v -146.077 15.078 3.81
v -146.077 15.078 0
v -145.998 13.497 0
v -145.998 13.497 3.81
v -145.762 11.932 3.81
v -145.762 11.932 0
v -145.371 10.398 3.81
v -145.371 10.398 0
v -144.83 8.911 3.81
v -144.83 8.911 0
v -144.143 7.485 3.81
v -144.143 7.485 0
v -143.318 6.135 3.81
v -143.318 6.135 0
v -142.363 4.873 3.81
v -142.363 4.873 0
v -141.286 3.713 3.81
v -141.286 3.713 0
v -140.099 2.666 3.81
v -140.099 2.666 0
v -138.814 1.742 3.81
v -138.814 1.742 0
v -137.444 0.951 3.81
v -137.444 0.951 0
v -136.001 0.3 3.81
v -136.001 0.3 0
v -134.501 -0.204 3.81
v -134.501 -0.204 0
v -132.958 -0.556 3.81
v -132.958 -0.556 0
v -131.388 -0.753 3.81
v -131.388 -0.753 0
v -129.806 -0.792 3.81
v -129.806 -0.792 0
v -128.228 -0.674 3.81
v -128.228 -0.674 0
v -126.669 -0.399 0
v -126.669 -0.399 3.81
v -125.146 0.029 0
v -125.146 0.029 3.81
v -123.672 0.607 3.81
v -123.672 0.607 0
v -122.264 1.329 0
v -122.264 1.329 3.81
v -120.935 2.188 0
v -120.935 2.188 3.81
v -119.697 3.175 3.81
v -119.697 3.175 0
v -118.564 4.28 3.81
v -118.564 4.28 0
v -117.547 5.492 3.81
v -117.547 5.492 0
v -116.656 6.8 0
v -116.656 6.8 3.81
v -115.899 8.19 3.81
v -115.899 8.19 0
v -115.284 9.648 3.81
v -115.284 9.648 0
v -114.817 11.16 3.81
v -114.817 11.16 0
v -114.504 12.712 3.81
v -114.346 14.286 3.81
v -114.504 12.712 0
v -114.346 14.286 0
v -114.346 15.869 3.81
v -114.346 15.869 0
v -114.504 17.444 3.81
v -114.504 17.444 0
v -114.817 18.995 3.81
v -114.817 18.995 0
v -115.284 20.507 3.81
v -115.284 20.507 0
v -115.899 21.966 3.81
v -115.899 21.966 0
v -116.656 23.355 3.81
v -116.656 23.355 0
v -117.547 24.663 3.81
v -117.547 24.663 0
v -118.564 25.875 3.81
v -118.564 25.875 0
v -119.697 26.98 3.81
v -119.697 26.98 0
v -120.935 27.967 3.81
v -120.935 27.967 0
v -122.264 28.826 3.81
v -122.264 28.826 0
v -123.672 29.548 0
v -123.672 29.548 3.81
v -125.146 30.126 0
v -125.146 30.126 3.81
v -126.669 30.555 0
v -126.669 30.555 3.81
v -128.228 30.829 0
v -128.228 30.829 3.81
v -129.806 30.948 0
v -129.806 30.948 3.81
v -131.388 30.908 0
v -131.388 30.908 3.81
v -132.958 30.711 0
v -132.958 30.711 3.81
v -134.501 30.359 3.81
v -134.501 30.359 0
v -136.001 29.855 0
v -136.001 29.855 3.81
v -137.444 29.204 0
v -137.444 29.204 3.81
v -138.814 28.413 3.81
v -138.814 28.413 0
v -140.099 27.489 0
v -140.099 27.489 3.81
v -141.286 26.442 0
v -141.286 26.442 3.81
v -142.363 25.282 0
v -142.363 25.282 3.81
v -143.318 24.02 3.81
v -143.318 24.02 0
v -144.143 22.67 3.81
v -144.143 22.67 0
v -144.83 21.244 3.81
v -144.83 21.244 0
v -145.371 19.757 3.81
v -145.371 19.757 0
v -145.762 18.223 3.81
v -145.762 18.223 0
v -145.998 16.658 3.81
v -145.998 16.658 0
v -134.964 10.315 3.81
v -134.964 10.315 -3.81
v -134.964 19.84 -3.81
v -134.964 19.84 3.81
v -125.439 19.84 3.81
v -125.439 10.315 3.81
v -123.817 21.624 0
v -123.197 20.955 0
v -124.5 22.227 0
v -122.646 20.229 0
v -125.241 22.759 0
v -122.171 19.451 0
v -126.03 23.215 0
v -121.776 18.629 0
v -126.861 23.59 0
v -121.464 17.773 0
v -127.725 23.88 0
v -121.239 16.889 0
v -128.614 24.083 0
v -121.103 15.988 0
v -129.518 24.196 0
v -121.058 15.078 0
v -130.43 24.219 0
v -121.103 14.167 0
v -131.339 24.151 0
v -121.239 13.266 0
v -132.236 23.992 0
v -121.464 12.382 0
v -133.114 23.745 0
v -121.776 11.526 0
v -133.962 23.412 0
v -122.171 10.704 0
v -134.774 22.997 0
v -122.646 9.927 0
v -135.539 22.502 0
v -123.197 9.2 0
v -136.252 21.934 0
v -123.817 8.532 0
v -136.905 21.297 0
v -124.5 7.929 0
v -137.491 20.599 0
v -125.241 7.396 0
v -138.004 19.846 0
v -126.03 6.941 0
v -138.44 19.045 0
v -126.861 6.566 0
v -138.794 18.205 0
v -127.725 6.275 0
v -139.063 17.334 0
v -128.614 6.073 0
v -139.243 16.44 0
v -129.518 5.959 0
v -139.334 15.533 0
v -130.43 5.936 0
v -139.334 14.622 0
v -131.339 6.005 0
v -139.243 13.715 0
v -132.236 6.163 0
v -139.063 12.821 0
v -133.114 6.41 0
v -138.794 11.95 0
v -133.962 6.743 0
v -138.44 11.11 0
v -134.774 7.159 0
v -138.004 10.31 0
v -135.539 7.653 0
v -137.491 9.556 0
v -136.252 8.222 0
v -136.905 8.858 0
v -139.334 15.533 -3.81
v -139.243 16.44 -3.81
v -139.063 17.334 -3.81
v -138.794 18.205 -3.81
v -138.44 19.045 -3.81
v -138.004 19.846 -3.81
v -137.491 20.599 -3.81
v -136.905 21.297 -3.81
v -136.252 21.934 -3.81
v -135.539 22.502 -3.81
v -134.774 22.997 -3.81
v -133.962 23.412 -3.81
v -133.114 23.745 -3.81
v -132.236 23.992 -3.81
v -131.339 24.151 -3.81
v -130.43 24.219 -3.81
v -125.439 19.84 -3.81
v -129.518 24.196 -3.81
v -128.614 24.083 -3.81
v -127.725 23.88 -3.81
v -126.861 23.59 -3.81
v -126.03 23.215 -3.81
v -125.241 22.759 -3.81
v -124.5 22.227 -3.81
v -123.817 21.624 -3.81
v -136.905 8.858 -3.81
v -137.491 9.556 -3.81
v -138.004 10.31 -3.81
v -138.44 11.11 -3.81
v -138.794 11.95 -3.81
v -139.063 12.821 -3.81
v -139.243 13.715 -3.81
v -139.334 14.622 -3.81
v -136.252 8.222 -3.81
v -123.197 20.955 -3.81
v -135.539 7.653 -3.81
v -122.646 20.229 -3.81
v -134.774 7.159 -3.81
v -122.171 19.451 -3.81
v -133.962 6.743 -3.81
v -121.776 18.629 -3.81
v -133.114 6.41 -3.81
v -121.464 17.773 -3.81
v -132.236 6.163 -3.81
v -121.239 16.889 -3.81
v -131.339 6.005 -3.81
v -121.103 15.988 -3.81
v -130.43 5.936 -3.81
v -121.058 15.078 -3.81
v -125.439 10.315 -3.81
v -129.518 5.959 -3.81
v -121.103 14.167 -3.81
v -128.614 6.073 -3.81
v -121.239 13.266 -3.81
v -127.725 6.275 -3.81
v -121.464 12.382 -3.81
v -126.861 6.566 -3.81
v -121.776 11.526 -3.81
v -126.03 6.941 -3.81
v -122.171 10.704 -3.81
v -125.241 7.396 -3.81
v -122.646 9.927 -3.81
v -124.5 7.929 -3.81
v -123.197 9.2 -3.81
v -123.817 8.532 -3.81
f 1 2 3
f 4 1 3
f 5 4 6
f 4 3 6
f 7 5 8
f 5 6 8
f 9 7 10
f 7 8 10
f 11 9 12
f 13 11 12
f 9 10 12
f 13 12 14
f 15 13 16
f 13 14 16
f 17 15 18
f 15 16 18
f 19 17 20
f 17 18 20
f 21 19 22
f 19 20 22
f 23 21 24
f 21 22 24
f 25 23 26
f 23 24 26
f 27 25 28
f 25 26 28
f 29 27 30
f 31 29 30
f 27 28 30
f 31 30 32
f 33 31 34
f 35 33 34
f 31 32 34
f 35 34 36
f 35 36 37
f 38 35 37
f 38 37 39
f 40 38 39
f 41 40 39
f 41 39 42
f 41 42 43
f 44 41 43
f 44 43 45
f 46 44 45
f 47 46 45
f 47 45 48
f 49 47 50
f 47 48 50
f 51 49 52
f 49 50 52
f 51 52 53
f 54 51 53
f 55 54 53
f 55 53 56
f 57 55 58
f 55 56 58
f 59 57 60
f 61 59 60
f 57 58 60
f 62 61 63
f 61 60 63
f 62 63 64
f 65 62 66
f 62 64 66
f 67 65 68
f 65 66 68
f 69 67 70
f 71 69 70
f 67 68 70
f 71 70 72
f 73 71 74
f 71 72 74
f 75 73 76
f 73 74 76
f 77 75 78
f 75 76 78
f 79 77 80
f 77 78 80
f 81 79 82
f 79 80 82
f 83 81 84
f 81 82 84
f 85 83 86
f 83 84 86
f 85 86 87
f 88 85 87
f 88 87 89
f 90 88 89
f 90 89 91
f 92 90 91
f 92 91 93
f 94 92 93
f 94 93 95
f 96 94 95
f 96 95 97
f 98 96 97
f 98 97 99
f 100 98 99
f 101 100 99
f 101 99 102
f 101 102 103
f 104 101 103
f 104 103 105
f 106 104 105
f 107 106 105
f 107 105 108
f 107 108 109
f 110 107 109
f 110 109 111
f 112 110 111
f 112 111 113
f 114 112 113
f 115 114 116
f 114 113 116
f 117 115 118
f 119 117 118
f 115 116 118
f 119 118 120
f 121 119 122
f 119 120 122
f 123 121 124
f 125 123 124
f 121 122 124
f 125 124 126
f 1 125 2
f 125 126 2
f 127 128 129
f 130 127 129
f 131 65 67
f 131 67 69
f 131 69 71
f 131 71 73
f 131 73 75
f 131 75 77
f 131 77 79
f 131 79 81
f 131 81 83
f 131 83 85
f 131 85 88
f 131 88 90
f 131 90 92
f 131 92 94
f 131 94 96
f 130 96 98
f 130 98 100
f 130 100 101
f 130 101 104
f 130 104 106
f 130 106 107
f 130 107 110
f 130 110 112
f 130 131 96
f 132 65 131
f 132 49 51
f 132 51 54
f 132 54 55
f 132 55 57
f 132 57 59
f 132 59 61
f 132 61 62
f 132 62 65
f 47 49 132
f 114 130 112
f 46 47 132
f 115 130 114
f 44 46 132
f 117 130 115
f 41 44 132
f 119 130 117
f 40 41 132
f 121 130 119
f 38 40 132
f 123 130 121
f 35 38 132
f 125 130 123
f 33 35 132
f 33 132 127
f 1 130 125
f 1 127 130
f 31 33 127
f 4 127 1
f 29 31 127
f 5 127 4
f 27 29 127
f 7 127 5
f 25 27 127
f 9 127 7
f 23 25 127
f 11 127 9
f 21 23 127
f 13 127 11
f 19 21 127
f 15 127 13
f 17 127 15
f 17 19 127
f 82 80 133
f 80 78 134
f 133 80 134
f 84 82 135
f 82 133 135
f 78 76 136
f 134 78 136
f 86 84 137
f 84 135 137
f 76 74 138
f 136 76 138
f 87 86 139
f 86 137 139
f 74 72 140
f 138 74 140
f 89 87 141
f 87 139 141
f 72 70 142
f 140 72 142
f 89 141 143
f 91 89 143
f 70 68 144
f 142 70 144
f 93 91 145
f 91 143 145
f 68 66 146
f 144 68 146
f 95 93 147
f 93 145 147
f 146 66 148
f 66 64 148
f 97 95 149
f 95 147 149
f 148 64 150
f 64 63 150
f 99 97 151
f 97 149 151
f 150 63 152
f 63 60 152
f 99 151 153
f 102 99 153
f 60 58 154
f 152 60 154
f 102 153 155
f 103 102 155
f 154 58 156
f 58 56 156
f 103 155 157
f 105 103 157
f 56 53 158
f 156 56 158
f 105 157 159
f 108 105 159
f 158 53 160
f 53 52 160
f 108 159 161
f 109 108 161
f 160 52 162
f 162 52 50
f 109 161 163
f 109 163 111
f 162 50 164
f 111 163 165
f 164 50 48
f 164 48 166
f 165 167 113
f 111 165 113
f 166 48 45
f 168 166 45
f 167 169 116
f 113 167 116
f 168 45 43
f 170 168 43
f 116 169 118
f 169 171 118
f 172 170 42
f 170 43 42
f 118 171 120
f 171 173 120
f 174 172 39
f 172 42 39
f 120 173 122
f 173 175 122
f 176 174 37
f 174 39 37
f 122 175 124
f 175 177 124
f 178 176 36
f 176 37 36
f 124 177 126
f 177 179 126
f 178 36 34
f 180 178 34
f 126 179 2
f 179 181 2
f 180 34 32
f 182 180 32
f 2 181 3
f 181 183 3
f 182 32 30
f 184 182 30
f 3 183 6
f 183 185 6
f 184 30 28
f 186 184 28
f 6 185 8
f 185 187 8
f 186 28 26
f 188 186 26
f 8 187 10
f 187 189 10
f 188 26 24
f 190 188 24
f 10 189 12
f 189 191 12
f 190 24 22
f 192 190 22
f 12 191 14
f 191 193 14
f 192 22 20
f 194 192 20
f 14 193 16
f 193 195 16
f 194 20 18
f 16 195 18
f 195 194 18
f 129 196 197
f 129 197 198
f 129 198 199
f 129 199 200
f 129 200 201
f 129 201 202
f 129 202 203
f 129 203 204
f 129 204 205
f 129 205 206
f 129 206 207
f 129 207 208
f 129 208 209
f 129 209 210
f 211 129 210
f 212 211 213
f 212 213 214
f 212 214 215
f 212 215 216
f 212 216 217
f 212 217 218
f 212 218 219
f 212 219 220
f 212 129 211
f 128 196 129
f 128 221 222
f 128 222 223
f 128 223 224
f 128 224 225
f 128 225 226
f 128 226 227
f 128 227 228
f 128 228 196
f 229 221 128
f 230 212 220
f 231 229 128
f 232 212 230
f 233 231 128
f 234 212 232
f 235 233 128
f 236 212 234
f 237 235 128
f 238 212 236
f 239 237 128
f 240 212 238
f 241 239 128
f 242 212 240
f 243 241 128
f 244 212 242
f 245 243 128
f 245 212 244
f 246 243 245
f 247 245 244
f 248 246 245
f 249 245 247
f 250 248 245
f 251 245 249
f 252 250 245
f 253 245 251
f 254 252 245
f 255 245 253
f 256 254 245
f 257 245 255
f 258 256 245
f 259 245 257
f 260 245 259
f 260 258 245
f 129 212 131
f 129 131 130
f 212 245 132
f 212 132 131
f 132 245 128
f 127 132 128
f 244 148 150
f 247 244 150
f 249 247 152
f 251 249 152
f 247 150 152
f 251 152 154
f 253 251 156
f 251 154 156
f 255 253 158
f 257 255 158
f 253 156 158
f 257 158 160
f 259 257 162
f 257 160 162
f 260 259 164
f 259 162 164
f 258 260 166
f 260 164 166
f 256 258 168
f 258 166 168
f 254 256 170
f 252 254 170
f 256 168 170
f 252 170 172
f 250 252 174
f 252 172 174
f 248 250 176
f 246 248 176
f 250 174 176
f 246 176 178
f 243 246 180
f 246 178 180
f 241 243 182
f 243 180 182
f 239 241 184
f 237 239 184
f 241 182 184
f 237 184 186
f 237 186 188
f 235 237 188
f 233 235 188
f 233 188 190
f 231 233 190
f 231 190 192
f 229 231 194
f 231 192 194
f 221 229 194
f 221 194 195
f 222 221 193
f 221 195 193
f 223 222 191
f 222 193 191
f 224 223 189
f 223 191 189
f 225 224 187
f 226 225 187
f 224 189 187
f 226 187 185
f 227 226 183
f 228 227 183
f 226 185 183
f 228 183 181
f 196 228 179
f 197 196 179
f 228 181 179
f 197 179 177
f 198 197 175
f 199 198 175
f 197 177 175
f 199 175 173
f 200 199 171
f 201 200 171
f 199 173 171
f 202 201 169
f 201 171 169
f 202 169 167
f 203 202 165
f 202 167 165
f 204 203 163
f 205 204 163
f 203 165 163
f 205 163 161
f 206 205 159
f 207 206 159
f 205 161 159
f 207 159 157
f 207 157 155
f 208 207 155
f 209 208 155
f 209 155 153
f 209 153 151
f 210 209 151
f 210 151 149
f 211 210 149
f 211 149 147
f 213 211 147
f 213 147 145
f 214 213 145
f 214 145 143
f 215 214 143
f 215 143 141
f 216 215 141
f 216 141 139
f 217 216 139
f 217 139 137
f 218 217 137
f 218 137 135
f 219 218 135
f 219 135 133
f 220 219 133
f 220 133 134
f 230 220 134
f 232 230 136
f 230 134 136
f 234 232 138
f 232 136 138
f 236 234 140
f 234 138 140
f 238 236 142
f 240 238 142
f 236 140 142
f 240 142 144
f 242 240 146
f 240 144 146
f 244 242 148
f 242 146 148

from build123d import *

# Parameters (mm, degrees)
SKETCH1_R           = 15.875
BOSS_EXTRUDE1_DEPTH = 3.81
SKETCH2_R           = 9.144
BOSS_EXTRUDE2_DEPTH = 3.81
SKETCH3_W           = 9.525
SKETCH3_H           = 9.525
CUT_EXTRUDE1_DEPTH  = 9.652


with BuildPart() as part:
    # Sketch1 → Boss-Extrude1 (new body)
    with BuildSketch(Plane.XY):
        with Locations(Location((-130.201551665, 15.077630219, 0), (0, 0, 180))):
            Circle(SKETCH1_R)
    extrude(amount=BOSS_EXTRUDE1_DEPTH)

    # Sketch2 → Boss-Extrude2 (add)
    with BuildSketch(Plane(origin=(0, 0, 0), x_dir=(-1, 0, 0), z_dir=(0, 0, -1))):
        with Locations(Location((130.201551665, 15.077630219, 0), (0, 0, 180))):
            Circle(SKETCH2_R)
    extrude(amount=BOSS_EXTRUDE2_DEPTH)

    # Sketch3 → Cut-Extrude1 (cut)
    with BuildSketch(Plane(origin=(0, 0, -3.81), x_dir=(-1, 0, 0), z_dir=(0, 0, -1))):
        with Locations((130.201551665, 15.077630219)):
            Rectangle(SKETCH3_W, SKETCH3_H)
    extrude(amount=-CUT_EXTRUDE1_DEPTH, mode=Mode.SUBTRACT)


solid = part.part
